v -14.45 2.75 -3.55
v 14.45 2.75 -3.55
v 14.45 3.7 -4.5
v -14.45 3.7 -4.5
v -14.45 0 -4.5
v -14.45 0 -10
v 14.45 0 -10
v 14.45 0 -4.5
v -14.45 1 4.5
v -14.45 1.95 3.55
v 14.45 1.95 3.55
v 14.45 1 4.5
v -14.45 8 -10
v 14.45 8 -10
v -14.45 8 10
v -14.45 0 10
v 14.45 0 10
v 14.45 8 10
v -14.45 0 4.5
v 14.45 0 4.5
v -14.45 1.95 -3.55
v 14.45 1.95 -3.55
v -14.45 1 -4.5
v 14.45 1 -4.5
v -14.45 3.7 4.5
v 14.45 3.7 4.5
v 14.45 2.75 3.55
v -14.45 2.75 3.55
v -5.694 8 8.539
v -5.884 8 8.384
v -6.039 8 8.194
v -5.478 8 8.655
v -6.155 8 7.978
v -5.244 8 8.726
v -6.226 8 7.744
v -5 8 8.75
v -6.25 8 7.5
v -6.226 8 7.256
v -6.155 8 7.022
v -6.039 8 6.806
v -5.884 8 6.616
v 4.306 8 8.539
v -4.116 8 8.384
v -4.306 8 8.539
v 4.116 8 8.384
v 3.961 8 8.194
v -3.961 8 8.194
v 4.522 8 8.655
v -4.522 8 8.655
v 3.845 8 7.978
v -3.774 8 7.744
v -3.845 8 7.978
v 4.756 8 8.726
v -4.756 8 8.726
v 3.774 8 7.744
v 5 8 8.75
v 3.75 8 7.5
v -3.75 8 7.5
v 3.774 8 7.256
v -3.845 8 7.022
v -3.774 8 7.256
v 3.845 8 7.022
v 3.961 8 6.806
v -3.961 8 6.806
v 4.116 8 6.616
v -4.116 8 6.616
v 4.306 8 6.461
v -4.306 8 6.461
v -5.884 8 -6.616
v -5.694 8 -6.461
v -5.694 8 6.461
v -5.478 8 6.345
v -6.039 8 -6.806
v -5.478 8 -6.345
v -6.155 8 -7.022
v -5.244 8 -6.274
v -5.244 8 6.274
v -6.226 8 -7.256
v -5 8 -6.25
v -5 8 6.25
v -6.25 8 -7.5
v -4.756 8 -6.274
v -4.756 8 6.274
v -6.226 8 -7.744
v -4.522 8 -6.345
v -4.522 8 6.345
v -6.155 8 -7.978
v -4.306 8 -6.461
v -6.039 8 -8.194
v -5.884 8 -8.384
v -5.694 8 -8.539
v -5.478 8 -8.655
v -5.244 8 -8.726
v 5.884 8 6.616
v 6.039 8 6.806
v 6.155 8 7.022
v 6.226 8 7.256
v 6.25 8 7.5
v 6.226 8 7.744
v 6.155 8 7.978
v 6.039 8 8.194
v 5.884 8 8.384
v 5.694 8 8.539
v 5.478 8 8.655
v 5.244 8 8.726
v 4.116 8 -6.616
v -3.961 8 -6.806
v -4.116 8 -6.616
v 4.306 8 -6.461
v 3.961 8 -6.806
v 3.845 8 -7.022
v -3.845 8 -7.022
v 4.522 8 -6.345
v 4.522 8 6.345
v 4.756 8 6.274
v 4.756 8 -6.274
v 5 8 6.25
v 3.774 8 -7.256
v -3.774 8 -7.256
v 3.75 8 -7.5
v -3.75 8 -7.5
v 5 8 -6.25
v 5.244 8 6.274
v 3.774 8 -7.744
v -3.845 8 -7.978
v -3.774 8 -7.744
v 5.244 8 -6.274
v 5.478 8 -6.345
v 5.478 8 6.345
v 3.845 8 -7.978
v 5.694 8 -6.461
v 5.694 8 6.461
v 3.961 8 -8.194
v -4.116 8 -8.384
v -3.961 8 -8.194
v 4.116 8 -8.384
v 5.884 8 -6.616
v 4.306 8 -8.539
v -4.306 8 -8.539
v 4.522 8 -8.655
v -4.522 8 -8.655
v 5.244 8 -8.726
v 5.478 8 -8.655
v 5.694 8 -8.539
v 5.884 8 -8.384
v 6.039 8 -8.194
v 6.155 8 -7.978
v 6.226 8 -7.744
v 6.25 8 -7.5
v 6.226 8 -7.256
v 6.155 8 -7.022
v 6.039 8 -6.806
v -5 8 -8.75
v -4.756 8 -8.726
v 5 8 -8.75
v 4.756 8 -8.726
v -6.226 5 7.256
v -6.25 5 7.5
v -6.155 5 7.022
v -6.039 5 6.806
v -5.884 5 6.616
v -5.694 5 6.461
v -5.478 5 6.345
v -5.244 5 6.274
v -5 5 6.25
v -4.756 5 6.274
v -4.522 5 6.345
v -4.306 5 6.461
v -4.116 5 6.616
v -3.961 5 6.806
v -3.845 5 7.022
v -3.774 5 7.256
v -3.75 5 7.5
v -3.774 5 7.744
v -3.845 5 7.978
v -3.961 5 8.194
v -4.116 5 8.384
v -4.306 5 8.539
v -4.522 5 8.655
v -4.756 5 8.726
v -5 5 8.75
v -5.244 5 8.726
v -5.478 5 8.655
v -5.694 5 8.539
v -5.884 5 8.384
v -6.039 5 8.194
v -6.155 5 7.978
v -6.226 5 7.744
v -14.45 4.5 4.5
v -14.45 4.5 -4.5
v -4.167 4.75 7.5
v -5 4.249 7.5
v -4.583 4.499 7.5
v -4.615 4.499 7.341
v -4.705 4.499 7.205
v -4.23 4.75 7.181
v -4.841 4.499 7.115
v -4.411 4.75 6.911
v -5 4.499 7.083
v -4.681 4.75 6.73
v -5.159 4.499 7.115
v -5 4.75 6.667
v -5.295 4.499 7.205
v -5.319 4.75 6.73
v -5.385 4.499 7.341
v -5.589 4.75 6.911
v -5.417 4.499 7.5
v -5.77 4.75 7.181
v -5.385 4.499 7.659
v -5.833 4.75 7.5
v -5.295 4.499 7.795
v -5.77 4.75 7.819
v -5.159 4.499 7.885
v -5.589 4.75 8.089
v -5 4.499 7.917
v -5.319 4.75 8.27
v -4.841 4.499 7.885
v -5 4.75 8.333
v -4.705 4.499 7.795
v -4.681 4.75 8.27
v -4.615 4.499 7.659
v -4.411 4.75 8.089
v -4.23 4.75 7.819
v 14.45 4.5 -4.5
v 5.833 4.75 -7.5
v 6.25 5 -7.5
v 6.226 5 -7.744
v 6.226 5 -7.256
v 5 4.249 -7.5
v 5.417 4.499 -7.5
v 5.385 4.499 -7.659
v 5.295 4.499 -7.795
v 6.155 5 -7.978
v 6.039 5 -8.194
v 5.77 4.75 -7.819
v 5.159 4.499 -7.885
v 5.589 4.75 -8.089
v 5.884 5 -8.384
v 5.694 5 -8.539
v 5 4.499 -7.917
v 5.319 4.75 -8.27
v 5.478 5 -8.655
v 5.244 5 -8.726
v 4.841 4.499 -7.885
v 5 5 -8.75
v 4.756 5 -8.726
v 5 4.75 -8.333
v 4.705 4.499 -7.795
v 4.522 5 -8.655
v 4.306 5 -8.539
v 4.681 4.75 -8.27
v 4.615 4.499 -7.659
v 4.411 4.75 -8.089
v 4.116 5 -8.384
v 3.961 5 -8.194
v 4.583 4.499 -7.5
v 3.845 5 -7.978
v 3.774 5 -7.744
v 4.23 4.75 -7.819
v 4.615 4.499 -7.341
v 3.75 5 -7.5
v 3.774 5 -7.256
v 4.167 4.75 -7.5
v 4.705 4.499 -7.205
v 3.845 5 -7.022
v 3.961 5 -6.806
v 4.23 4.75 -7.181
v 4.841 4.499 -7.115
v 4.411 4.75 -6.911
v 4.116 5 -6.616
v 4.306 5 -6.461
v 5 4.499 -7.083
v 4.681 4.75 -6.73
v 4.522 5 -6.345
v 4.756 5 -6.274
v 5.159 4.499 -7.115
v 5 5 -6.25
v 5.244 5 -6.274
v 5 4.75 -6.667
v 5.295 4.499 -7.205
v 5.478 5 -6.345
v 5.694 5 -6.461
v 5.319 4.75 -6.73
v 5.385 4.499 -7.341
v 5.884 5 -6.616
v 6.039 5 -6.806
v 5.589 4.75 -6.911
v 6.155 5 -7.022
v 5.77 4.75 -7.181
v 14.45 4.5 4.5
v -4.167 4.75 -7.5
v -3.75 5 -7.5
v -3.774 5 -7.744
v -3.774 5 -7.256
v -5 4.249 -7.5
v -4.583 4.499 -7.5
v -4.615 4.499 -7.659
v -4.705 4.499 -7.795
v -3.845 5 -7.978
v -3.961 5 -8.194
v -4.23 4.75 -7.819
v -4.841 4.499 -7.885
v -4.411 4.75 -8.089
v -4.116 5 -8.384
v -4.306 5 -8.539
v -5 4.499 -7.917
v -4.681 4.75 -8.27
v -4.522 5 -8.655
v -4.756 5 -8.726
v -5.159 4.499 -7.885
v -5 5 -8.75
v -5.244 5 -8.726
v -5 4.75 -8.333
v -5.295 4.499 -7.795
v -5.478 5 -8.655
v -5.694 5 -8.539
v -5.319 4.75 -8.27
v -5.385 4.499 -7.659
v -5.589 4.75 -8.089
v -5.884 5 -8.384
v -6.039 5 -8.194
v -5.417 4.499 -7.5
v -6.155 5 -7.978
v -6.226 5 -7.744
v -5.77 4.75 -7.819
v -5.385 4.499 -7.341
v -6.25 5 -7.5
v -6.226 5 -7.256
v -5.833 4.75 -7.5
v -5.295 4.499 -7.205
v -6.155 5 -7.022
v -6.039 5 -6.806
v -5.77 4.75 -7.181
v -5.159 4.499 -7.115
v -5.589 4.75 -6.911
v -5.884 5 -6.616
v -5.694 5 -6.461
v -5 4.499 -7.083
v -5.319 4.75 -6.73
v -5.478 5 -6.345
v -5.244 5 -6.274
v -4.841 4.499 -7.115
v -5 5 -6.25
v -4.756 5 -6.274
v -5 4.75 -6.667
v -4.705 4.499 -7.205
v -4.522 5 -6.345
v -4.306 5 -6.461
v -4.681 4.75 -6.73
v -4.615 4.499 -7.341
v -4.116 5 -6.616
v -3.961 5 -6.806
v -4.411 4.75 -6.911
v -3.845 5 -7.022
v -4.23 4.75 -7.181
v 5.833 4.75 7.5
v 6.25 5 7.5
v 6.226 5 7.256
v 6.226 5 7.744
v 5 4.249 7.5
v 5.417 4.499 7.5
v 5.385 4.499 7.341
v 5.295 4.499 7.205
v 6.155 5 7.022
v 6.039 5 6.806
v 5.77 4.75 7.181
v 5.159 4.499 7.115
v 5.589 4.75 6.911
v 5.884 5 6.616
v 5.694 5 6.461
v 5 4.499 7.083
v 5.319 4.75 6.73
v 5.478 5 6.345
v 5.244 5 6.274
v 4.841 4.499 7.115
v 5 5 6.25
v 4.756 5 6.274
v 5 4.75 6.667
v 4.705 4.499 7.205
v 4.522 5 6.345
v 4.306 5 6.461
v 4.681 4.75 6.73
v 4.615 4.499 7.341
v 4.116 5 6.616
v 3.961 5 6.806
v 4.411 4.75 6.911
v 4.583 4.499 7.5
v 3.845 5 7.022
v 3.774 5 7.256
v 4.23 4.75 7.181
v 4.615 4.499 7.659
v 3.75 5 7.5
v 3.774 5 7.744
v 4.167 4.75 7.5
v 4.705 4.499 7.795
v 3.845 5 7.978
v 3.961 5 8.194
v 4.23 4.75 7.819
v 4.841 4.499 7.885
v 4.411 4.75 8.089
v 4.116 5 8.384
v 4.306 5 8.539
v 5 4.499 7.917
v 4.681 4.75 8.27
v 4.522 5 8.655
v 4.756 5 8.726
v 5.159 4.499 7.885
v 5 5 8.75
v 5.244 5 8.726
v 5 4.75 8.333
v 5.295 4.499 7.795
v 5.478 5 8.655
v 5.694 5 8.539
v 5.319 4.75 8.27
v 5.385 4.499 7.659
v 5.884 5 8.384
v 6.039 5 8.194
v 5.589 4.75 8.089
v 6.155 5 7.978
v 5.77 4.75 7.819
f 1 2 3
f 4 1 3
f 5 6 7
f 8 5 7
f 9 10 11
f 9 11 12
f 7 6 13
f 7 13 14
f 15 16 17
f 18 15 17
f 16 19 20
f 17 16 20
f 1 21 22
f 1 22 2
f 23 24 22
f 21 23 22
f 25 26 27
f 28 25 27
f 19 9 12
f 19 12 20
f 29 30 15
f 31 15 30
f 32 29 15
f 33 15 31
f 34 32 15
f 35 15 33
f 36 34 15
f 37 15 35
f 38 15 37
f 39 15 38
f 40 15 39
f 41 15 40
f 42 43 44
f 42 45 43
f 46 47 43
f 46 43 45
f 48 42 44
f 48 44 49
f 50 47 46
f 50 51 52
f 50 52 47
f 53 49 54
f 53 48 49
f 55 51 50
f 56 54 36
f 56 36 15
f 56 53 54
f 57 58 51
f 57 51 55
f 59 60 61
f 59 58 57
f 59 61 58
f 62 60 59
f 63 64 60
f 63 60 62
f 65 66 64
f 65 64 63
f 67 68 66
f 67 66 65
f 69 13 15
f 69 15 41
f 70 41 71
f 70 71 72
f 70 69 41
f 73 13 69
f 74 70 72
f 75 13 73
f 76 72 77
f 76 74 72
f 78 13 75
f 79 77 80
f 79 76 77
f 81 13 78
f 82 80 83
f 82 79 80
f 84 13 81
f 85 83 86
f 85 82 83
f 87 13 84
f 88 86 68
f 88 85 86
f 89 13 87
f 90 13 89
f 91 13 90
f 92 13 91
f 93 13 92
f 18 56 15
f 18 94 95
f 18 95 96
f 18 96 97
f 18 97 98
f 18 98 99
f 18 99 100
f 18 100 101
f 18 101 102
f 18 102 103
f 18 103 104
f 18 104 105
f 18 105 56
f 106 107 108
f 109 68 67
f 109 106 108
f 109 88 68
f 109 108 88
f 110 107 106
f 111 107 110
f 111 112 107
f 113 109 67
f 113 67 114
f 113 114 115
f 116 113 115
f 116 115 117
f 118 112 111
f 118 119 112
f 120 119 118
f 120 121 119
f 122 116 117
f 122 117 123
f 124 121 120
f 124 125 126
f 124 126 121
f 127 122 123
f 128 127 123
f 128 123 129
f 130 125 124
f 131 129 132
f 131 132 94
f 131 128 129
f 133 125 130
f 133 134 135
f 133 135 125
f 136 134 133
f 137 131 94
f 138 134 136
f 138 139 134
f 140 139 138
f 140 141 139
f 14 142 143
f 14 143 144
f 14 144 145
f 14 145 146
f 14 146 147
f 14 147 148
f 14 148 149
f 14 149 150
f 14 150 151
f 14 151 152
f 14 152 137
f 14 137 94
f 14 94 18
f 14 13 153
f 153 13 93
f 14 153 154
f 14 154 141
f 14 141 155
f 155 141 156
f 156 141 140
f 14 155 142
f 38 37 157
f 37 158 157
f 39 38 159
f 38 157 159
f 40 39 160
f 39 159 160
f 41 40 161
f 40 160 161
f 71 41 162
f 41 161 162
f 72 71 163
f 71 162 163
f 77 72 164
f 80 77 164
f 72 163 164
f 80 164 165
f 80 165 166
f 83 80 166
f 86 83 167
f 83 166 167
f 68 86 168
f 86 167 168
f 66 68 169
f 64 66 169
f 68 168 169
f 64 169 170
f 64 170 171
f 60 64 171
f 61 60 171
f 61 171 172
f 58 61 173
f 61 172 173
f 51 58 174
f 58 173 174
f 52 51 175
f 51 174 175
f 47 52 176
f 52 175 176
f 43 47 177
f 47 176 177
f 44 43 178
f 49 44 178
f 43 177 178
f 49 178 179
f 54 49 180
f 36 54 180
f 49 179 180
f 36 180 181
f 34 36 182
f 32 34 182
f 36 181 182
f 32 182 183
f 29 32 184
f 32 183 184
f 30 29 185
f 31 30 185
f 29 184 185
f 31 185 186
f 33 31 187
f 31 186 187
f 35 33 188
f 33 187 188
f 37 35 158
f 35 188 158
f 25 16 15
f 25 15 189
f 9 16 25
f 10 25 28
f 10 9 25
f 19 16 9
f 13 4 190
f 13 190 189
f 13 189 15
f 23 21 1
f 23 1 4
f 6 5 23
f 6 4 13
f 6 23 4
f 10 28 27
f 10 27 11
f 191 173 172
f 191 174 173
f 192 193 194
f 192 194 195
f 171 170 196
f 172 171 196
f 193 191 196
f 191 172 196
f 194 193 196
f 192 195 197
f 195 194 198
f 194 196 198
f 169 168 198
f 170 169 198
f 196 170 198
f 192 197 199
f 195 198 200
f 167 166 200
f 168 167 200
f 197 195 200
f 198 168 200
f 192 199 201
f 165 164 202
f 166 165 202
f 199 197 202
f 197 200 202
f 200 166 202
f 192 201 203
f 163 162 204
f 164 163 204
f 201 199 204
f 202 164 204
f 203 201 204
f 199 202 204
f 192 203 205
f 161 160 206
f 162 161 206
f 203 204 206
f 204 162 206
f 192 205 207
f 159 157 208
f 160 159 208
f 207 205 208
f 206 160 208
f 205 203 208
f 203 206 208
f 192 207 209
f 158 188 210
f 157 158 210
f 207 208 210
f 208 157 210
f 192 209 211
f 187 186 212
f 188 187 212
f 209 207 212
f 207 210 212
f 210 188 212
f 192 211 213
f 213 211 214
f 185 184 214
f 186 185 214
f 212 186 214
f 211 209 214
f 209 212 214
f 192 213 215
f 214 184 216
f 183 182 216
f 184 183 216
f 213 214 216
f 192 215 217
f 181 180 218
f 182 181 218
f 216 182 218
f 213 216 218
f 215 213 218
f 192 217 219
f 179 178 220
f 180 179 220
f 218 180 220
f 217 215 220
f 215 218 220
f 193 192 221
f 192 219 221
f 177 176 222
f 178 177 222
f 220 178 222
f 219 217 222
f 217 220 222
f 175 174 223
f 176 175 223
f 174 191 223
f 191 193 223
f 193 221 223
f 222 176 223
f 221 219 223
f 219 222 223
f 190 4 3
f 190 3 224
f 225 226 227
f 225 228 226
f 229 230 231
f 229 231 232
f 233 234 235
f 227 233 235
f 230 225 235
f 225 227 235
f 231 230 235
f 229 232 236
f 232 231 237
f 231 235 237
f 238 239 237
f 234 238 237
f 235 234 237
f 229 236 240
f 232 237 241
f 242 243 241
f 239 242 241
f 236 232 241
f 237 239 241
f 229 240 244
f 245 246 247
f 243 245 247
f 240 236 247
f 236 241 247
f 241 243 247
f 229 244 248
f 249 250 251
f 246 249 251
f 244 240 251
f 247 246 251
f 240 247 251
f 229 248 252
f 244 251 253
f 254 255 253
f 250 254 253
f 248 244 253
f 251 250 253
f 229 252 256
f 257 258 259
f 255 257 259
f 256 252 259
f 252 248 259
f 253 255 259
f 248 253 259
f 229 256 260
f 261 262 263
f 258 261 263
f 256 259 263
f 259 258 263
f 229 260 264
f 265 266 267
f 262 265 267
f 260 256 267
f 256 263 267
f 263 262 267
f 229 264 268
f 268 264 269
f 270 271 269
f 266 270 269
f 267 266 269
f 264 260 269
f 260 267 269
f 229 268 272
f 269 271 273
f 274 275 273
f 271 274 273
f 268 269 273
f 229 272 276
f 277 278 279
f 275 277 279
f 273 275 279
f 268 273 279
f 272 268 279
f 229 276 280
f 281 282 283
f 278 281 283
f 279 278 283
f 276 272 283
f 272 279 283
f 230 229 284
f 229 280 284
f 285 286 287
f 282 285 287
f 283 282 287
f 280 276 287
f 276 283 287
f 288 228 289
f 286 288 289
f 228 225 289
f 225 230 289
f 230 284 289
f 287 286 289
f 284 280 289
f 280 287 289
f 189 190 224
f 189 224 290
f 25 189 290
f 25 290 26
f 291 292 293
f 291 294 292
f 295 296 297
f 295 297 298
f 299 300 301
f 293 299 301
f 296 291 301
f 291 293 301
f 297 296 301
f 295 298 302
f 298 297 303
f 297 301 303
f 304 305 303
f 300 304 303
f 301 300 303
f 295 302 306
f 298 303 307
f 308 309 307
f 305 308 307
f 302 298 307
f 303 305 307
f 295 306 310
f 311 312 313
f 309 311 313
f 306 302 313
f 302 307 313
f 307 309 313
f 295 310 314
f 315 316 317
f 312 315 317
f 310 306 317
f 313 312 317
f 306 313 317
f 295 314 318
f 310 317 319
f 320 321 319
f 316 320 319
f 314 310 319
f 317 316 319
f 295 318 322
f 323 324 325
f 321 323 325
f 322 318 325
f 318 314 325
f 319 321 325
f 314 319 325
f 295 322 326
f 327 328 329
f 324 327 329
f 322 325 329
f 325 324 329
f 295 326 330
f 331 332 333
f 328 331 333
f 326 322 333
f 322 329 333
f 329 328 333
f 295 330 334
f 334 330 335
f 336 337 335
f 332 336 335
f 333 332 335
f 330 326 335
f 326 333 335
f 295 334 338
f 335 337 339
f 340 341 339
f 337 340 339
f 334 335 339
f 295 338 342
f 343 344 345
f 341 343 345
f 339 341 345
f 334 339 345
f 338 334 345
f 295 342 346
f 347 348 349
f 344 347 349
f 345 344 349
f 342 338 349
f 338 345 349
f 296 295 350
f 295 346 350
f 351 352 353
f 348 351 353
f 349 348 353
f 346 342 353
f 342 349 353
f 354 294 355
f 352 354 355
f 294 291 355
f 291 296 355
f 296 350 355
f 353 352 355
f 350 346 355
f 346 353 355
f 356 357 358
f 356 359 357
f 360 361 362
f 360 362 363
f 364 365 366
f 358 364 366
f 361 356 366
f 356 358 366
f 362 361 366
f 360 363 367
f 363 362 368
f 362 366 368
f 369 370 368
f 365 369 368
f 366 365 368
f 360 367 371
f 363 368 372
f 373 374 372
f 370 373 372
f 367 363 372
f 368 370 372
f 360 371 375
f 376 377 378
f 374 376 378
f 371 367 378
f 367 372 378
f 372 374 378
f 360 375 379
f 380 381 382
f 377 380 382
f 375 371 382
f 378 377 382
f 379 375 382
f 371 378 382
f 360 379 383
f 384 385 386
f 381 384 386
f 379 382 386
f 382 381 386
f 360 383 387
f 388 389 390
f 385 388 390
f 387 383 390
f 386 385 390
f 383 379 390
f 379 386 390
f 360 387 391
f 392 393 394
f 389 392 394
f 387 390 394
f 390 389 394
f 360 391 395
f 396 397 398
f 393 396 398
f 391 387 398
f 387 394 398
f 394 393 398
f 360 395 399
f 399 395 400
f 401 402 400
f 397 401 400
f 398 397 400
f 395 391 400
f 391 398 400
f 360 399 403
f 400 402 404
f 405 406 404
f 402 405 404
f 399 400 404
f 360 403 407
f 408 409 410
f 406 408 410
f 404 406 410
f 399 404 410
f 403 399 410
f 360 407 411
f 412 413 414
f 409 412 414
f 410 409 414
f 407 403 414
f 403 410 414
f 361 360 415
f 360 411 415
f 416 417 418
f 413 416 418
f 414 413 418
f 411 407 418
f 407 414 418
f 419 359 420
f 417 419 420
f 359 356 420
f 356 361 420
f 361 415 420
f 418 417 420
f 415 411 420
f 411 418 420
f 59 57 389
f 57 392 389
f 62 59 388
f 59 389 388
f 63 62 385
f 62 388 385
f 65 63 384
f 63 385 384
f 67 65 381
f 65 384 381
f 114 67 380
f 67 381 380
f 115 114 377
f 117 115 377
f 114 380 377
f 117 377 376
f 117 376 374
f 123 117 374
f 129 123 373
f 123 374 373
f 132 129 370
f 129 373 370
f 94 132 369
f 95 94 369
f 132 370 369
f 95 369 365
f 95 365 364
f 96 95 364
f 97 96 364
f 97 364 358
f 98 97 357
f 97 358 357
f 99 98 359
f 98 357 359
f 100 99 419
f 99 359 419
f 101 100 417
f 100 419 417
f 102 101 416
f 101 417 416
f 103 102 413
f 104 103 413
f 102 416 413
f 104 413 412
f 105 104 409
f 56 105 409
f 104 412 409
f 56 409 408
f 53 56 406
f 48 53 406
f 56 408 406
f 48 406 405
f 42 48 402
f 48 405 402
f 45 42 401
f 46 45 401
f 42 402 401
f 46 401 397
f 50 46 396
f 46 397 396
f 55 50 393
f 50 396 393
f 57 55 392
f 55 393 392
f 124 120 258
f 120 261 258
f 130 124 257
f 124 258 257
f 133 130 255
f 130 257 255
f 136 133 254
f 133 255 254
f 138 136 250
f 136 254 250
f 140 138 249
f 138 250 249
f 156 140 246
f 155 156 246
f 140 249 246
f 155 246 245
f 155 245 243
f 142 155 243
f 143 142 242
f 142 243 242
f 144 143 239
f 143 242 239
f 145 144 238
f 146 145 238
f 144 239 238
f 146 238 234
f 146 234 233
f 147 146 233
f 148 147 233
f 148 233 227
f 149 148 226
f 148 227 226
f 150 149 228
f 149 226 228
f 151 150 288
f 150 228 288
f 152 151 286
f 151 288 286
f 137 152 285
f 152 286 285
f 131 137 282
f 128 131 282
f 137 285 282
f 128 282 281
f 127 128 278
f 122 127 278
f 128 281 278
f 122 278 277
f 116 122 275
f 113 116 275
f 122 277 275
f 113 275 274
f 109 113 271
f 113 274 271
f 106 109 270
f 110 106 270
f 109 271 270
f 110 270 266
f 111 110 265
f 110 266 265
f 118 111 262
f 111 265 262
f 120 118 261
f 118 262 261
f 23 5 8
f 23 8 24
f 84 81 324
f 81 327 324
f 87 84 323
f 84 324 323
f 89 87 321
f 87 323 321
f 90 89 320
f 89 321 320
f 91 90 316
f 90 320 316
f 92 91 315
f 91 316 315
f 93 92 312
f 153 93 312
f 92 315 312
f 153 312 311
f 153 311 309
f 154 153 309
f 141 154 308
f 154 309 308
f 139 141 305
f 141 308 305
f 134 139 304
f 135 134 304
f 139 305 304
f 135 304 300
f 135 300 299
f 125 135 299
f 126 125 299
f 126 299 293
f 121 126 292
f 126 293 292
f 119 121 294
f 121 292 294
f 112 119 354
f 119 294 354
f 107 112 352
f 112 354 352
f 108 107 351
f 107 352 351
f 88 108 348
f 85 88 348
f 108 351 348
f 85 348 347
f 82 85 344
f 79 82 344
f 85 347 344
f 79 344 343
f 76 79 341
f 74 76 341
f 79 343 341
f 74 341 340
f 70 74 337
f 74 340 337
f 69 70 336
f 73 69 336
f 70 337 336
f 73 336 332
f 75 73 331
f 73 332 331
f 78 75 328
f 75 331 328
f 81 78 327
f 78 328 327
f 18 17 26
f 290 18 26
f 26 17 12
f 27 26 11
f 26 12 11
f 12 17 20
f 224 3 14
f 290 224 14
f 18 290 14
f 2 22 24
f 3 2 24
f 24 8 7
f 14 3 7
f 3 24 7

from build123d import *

# Parameters (mm, degrees)
SKETCH_1_W             = 28.9
SKETCH_1_H             = 20
EXTRUDE_1_DEPTH        = 8
CUT_EXTRUDE_1_DEPTH    = 32.610283137
HOLE_WIZARD_M3_1_D     = 2.5
HOLE_WIZARD_M3_1_DEPTH = 3
HOLE_WIZARD_M3_1_TIP   = 0.751075774


with BuildPart() as part:
    # 草图1 → 凸台-拉伸1 (new body)
    with BuildSketch(Plane(origin=(0, 0, 0), x_dir=(1, 0, 0), z_dir=(0, 1, 0))):
        Rectangle(SKETCH_1_W, SKETCH_1_H)
    extrude(amount=EXTRUDE_1_DEPTH)

    # 草图2 → 切除-拉伸1 (cut, through all)
    with BuildSketch(Plane.ZY.offset(14.45)):
        Polygon((-4.5, 0), (-4.5, 1), (-3.55, 1.95), (-3.55, 2.75), (-4.5, 3.7), (-4.5, 4.5), (4.5, 4.5), (4.5, 3.7), (3.55, 2.75), (3.55, 1.95), (4.5, 1), (4.5, 0), align=None)
    extrude(amount=-CUT_EXTRUDE_1_DEPTH, mode=Mode.SUBTRACT)

    # M3 螺纹孔1
    with Locations(Plane(origin=(0, 8, 0), x_dir=(1, 0, 0), z_dir=(0, 1, 0))):
        with Locations((-5, -7.5), (5, -7.5), (5, 7.5), (-5, 7.5)):
            Hole(HOLE_WIZARD_M3_1_D / 2, depth=HOLE_WIZARD_M3_1_DEPTH)
            with Locations((0, 0, -(HOLE_WIZARD_M3_1_DEPTH + HOLE_WIZARD_M3_1_TIP / 2))):  # 118° drill point
                Cone(0, HOLE_WIZARD_M3_1_D / 2, HOLE_WIZARD_M3_1_TIP, mode=Mode.SUBTRACT)


solid = part.part
